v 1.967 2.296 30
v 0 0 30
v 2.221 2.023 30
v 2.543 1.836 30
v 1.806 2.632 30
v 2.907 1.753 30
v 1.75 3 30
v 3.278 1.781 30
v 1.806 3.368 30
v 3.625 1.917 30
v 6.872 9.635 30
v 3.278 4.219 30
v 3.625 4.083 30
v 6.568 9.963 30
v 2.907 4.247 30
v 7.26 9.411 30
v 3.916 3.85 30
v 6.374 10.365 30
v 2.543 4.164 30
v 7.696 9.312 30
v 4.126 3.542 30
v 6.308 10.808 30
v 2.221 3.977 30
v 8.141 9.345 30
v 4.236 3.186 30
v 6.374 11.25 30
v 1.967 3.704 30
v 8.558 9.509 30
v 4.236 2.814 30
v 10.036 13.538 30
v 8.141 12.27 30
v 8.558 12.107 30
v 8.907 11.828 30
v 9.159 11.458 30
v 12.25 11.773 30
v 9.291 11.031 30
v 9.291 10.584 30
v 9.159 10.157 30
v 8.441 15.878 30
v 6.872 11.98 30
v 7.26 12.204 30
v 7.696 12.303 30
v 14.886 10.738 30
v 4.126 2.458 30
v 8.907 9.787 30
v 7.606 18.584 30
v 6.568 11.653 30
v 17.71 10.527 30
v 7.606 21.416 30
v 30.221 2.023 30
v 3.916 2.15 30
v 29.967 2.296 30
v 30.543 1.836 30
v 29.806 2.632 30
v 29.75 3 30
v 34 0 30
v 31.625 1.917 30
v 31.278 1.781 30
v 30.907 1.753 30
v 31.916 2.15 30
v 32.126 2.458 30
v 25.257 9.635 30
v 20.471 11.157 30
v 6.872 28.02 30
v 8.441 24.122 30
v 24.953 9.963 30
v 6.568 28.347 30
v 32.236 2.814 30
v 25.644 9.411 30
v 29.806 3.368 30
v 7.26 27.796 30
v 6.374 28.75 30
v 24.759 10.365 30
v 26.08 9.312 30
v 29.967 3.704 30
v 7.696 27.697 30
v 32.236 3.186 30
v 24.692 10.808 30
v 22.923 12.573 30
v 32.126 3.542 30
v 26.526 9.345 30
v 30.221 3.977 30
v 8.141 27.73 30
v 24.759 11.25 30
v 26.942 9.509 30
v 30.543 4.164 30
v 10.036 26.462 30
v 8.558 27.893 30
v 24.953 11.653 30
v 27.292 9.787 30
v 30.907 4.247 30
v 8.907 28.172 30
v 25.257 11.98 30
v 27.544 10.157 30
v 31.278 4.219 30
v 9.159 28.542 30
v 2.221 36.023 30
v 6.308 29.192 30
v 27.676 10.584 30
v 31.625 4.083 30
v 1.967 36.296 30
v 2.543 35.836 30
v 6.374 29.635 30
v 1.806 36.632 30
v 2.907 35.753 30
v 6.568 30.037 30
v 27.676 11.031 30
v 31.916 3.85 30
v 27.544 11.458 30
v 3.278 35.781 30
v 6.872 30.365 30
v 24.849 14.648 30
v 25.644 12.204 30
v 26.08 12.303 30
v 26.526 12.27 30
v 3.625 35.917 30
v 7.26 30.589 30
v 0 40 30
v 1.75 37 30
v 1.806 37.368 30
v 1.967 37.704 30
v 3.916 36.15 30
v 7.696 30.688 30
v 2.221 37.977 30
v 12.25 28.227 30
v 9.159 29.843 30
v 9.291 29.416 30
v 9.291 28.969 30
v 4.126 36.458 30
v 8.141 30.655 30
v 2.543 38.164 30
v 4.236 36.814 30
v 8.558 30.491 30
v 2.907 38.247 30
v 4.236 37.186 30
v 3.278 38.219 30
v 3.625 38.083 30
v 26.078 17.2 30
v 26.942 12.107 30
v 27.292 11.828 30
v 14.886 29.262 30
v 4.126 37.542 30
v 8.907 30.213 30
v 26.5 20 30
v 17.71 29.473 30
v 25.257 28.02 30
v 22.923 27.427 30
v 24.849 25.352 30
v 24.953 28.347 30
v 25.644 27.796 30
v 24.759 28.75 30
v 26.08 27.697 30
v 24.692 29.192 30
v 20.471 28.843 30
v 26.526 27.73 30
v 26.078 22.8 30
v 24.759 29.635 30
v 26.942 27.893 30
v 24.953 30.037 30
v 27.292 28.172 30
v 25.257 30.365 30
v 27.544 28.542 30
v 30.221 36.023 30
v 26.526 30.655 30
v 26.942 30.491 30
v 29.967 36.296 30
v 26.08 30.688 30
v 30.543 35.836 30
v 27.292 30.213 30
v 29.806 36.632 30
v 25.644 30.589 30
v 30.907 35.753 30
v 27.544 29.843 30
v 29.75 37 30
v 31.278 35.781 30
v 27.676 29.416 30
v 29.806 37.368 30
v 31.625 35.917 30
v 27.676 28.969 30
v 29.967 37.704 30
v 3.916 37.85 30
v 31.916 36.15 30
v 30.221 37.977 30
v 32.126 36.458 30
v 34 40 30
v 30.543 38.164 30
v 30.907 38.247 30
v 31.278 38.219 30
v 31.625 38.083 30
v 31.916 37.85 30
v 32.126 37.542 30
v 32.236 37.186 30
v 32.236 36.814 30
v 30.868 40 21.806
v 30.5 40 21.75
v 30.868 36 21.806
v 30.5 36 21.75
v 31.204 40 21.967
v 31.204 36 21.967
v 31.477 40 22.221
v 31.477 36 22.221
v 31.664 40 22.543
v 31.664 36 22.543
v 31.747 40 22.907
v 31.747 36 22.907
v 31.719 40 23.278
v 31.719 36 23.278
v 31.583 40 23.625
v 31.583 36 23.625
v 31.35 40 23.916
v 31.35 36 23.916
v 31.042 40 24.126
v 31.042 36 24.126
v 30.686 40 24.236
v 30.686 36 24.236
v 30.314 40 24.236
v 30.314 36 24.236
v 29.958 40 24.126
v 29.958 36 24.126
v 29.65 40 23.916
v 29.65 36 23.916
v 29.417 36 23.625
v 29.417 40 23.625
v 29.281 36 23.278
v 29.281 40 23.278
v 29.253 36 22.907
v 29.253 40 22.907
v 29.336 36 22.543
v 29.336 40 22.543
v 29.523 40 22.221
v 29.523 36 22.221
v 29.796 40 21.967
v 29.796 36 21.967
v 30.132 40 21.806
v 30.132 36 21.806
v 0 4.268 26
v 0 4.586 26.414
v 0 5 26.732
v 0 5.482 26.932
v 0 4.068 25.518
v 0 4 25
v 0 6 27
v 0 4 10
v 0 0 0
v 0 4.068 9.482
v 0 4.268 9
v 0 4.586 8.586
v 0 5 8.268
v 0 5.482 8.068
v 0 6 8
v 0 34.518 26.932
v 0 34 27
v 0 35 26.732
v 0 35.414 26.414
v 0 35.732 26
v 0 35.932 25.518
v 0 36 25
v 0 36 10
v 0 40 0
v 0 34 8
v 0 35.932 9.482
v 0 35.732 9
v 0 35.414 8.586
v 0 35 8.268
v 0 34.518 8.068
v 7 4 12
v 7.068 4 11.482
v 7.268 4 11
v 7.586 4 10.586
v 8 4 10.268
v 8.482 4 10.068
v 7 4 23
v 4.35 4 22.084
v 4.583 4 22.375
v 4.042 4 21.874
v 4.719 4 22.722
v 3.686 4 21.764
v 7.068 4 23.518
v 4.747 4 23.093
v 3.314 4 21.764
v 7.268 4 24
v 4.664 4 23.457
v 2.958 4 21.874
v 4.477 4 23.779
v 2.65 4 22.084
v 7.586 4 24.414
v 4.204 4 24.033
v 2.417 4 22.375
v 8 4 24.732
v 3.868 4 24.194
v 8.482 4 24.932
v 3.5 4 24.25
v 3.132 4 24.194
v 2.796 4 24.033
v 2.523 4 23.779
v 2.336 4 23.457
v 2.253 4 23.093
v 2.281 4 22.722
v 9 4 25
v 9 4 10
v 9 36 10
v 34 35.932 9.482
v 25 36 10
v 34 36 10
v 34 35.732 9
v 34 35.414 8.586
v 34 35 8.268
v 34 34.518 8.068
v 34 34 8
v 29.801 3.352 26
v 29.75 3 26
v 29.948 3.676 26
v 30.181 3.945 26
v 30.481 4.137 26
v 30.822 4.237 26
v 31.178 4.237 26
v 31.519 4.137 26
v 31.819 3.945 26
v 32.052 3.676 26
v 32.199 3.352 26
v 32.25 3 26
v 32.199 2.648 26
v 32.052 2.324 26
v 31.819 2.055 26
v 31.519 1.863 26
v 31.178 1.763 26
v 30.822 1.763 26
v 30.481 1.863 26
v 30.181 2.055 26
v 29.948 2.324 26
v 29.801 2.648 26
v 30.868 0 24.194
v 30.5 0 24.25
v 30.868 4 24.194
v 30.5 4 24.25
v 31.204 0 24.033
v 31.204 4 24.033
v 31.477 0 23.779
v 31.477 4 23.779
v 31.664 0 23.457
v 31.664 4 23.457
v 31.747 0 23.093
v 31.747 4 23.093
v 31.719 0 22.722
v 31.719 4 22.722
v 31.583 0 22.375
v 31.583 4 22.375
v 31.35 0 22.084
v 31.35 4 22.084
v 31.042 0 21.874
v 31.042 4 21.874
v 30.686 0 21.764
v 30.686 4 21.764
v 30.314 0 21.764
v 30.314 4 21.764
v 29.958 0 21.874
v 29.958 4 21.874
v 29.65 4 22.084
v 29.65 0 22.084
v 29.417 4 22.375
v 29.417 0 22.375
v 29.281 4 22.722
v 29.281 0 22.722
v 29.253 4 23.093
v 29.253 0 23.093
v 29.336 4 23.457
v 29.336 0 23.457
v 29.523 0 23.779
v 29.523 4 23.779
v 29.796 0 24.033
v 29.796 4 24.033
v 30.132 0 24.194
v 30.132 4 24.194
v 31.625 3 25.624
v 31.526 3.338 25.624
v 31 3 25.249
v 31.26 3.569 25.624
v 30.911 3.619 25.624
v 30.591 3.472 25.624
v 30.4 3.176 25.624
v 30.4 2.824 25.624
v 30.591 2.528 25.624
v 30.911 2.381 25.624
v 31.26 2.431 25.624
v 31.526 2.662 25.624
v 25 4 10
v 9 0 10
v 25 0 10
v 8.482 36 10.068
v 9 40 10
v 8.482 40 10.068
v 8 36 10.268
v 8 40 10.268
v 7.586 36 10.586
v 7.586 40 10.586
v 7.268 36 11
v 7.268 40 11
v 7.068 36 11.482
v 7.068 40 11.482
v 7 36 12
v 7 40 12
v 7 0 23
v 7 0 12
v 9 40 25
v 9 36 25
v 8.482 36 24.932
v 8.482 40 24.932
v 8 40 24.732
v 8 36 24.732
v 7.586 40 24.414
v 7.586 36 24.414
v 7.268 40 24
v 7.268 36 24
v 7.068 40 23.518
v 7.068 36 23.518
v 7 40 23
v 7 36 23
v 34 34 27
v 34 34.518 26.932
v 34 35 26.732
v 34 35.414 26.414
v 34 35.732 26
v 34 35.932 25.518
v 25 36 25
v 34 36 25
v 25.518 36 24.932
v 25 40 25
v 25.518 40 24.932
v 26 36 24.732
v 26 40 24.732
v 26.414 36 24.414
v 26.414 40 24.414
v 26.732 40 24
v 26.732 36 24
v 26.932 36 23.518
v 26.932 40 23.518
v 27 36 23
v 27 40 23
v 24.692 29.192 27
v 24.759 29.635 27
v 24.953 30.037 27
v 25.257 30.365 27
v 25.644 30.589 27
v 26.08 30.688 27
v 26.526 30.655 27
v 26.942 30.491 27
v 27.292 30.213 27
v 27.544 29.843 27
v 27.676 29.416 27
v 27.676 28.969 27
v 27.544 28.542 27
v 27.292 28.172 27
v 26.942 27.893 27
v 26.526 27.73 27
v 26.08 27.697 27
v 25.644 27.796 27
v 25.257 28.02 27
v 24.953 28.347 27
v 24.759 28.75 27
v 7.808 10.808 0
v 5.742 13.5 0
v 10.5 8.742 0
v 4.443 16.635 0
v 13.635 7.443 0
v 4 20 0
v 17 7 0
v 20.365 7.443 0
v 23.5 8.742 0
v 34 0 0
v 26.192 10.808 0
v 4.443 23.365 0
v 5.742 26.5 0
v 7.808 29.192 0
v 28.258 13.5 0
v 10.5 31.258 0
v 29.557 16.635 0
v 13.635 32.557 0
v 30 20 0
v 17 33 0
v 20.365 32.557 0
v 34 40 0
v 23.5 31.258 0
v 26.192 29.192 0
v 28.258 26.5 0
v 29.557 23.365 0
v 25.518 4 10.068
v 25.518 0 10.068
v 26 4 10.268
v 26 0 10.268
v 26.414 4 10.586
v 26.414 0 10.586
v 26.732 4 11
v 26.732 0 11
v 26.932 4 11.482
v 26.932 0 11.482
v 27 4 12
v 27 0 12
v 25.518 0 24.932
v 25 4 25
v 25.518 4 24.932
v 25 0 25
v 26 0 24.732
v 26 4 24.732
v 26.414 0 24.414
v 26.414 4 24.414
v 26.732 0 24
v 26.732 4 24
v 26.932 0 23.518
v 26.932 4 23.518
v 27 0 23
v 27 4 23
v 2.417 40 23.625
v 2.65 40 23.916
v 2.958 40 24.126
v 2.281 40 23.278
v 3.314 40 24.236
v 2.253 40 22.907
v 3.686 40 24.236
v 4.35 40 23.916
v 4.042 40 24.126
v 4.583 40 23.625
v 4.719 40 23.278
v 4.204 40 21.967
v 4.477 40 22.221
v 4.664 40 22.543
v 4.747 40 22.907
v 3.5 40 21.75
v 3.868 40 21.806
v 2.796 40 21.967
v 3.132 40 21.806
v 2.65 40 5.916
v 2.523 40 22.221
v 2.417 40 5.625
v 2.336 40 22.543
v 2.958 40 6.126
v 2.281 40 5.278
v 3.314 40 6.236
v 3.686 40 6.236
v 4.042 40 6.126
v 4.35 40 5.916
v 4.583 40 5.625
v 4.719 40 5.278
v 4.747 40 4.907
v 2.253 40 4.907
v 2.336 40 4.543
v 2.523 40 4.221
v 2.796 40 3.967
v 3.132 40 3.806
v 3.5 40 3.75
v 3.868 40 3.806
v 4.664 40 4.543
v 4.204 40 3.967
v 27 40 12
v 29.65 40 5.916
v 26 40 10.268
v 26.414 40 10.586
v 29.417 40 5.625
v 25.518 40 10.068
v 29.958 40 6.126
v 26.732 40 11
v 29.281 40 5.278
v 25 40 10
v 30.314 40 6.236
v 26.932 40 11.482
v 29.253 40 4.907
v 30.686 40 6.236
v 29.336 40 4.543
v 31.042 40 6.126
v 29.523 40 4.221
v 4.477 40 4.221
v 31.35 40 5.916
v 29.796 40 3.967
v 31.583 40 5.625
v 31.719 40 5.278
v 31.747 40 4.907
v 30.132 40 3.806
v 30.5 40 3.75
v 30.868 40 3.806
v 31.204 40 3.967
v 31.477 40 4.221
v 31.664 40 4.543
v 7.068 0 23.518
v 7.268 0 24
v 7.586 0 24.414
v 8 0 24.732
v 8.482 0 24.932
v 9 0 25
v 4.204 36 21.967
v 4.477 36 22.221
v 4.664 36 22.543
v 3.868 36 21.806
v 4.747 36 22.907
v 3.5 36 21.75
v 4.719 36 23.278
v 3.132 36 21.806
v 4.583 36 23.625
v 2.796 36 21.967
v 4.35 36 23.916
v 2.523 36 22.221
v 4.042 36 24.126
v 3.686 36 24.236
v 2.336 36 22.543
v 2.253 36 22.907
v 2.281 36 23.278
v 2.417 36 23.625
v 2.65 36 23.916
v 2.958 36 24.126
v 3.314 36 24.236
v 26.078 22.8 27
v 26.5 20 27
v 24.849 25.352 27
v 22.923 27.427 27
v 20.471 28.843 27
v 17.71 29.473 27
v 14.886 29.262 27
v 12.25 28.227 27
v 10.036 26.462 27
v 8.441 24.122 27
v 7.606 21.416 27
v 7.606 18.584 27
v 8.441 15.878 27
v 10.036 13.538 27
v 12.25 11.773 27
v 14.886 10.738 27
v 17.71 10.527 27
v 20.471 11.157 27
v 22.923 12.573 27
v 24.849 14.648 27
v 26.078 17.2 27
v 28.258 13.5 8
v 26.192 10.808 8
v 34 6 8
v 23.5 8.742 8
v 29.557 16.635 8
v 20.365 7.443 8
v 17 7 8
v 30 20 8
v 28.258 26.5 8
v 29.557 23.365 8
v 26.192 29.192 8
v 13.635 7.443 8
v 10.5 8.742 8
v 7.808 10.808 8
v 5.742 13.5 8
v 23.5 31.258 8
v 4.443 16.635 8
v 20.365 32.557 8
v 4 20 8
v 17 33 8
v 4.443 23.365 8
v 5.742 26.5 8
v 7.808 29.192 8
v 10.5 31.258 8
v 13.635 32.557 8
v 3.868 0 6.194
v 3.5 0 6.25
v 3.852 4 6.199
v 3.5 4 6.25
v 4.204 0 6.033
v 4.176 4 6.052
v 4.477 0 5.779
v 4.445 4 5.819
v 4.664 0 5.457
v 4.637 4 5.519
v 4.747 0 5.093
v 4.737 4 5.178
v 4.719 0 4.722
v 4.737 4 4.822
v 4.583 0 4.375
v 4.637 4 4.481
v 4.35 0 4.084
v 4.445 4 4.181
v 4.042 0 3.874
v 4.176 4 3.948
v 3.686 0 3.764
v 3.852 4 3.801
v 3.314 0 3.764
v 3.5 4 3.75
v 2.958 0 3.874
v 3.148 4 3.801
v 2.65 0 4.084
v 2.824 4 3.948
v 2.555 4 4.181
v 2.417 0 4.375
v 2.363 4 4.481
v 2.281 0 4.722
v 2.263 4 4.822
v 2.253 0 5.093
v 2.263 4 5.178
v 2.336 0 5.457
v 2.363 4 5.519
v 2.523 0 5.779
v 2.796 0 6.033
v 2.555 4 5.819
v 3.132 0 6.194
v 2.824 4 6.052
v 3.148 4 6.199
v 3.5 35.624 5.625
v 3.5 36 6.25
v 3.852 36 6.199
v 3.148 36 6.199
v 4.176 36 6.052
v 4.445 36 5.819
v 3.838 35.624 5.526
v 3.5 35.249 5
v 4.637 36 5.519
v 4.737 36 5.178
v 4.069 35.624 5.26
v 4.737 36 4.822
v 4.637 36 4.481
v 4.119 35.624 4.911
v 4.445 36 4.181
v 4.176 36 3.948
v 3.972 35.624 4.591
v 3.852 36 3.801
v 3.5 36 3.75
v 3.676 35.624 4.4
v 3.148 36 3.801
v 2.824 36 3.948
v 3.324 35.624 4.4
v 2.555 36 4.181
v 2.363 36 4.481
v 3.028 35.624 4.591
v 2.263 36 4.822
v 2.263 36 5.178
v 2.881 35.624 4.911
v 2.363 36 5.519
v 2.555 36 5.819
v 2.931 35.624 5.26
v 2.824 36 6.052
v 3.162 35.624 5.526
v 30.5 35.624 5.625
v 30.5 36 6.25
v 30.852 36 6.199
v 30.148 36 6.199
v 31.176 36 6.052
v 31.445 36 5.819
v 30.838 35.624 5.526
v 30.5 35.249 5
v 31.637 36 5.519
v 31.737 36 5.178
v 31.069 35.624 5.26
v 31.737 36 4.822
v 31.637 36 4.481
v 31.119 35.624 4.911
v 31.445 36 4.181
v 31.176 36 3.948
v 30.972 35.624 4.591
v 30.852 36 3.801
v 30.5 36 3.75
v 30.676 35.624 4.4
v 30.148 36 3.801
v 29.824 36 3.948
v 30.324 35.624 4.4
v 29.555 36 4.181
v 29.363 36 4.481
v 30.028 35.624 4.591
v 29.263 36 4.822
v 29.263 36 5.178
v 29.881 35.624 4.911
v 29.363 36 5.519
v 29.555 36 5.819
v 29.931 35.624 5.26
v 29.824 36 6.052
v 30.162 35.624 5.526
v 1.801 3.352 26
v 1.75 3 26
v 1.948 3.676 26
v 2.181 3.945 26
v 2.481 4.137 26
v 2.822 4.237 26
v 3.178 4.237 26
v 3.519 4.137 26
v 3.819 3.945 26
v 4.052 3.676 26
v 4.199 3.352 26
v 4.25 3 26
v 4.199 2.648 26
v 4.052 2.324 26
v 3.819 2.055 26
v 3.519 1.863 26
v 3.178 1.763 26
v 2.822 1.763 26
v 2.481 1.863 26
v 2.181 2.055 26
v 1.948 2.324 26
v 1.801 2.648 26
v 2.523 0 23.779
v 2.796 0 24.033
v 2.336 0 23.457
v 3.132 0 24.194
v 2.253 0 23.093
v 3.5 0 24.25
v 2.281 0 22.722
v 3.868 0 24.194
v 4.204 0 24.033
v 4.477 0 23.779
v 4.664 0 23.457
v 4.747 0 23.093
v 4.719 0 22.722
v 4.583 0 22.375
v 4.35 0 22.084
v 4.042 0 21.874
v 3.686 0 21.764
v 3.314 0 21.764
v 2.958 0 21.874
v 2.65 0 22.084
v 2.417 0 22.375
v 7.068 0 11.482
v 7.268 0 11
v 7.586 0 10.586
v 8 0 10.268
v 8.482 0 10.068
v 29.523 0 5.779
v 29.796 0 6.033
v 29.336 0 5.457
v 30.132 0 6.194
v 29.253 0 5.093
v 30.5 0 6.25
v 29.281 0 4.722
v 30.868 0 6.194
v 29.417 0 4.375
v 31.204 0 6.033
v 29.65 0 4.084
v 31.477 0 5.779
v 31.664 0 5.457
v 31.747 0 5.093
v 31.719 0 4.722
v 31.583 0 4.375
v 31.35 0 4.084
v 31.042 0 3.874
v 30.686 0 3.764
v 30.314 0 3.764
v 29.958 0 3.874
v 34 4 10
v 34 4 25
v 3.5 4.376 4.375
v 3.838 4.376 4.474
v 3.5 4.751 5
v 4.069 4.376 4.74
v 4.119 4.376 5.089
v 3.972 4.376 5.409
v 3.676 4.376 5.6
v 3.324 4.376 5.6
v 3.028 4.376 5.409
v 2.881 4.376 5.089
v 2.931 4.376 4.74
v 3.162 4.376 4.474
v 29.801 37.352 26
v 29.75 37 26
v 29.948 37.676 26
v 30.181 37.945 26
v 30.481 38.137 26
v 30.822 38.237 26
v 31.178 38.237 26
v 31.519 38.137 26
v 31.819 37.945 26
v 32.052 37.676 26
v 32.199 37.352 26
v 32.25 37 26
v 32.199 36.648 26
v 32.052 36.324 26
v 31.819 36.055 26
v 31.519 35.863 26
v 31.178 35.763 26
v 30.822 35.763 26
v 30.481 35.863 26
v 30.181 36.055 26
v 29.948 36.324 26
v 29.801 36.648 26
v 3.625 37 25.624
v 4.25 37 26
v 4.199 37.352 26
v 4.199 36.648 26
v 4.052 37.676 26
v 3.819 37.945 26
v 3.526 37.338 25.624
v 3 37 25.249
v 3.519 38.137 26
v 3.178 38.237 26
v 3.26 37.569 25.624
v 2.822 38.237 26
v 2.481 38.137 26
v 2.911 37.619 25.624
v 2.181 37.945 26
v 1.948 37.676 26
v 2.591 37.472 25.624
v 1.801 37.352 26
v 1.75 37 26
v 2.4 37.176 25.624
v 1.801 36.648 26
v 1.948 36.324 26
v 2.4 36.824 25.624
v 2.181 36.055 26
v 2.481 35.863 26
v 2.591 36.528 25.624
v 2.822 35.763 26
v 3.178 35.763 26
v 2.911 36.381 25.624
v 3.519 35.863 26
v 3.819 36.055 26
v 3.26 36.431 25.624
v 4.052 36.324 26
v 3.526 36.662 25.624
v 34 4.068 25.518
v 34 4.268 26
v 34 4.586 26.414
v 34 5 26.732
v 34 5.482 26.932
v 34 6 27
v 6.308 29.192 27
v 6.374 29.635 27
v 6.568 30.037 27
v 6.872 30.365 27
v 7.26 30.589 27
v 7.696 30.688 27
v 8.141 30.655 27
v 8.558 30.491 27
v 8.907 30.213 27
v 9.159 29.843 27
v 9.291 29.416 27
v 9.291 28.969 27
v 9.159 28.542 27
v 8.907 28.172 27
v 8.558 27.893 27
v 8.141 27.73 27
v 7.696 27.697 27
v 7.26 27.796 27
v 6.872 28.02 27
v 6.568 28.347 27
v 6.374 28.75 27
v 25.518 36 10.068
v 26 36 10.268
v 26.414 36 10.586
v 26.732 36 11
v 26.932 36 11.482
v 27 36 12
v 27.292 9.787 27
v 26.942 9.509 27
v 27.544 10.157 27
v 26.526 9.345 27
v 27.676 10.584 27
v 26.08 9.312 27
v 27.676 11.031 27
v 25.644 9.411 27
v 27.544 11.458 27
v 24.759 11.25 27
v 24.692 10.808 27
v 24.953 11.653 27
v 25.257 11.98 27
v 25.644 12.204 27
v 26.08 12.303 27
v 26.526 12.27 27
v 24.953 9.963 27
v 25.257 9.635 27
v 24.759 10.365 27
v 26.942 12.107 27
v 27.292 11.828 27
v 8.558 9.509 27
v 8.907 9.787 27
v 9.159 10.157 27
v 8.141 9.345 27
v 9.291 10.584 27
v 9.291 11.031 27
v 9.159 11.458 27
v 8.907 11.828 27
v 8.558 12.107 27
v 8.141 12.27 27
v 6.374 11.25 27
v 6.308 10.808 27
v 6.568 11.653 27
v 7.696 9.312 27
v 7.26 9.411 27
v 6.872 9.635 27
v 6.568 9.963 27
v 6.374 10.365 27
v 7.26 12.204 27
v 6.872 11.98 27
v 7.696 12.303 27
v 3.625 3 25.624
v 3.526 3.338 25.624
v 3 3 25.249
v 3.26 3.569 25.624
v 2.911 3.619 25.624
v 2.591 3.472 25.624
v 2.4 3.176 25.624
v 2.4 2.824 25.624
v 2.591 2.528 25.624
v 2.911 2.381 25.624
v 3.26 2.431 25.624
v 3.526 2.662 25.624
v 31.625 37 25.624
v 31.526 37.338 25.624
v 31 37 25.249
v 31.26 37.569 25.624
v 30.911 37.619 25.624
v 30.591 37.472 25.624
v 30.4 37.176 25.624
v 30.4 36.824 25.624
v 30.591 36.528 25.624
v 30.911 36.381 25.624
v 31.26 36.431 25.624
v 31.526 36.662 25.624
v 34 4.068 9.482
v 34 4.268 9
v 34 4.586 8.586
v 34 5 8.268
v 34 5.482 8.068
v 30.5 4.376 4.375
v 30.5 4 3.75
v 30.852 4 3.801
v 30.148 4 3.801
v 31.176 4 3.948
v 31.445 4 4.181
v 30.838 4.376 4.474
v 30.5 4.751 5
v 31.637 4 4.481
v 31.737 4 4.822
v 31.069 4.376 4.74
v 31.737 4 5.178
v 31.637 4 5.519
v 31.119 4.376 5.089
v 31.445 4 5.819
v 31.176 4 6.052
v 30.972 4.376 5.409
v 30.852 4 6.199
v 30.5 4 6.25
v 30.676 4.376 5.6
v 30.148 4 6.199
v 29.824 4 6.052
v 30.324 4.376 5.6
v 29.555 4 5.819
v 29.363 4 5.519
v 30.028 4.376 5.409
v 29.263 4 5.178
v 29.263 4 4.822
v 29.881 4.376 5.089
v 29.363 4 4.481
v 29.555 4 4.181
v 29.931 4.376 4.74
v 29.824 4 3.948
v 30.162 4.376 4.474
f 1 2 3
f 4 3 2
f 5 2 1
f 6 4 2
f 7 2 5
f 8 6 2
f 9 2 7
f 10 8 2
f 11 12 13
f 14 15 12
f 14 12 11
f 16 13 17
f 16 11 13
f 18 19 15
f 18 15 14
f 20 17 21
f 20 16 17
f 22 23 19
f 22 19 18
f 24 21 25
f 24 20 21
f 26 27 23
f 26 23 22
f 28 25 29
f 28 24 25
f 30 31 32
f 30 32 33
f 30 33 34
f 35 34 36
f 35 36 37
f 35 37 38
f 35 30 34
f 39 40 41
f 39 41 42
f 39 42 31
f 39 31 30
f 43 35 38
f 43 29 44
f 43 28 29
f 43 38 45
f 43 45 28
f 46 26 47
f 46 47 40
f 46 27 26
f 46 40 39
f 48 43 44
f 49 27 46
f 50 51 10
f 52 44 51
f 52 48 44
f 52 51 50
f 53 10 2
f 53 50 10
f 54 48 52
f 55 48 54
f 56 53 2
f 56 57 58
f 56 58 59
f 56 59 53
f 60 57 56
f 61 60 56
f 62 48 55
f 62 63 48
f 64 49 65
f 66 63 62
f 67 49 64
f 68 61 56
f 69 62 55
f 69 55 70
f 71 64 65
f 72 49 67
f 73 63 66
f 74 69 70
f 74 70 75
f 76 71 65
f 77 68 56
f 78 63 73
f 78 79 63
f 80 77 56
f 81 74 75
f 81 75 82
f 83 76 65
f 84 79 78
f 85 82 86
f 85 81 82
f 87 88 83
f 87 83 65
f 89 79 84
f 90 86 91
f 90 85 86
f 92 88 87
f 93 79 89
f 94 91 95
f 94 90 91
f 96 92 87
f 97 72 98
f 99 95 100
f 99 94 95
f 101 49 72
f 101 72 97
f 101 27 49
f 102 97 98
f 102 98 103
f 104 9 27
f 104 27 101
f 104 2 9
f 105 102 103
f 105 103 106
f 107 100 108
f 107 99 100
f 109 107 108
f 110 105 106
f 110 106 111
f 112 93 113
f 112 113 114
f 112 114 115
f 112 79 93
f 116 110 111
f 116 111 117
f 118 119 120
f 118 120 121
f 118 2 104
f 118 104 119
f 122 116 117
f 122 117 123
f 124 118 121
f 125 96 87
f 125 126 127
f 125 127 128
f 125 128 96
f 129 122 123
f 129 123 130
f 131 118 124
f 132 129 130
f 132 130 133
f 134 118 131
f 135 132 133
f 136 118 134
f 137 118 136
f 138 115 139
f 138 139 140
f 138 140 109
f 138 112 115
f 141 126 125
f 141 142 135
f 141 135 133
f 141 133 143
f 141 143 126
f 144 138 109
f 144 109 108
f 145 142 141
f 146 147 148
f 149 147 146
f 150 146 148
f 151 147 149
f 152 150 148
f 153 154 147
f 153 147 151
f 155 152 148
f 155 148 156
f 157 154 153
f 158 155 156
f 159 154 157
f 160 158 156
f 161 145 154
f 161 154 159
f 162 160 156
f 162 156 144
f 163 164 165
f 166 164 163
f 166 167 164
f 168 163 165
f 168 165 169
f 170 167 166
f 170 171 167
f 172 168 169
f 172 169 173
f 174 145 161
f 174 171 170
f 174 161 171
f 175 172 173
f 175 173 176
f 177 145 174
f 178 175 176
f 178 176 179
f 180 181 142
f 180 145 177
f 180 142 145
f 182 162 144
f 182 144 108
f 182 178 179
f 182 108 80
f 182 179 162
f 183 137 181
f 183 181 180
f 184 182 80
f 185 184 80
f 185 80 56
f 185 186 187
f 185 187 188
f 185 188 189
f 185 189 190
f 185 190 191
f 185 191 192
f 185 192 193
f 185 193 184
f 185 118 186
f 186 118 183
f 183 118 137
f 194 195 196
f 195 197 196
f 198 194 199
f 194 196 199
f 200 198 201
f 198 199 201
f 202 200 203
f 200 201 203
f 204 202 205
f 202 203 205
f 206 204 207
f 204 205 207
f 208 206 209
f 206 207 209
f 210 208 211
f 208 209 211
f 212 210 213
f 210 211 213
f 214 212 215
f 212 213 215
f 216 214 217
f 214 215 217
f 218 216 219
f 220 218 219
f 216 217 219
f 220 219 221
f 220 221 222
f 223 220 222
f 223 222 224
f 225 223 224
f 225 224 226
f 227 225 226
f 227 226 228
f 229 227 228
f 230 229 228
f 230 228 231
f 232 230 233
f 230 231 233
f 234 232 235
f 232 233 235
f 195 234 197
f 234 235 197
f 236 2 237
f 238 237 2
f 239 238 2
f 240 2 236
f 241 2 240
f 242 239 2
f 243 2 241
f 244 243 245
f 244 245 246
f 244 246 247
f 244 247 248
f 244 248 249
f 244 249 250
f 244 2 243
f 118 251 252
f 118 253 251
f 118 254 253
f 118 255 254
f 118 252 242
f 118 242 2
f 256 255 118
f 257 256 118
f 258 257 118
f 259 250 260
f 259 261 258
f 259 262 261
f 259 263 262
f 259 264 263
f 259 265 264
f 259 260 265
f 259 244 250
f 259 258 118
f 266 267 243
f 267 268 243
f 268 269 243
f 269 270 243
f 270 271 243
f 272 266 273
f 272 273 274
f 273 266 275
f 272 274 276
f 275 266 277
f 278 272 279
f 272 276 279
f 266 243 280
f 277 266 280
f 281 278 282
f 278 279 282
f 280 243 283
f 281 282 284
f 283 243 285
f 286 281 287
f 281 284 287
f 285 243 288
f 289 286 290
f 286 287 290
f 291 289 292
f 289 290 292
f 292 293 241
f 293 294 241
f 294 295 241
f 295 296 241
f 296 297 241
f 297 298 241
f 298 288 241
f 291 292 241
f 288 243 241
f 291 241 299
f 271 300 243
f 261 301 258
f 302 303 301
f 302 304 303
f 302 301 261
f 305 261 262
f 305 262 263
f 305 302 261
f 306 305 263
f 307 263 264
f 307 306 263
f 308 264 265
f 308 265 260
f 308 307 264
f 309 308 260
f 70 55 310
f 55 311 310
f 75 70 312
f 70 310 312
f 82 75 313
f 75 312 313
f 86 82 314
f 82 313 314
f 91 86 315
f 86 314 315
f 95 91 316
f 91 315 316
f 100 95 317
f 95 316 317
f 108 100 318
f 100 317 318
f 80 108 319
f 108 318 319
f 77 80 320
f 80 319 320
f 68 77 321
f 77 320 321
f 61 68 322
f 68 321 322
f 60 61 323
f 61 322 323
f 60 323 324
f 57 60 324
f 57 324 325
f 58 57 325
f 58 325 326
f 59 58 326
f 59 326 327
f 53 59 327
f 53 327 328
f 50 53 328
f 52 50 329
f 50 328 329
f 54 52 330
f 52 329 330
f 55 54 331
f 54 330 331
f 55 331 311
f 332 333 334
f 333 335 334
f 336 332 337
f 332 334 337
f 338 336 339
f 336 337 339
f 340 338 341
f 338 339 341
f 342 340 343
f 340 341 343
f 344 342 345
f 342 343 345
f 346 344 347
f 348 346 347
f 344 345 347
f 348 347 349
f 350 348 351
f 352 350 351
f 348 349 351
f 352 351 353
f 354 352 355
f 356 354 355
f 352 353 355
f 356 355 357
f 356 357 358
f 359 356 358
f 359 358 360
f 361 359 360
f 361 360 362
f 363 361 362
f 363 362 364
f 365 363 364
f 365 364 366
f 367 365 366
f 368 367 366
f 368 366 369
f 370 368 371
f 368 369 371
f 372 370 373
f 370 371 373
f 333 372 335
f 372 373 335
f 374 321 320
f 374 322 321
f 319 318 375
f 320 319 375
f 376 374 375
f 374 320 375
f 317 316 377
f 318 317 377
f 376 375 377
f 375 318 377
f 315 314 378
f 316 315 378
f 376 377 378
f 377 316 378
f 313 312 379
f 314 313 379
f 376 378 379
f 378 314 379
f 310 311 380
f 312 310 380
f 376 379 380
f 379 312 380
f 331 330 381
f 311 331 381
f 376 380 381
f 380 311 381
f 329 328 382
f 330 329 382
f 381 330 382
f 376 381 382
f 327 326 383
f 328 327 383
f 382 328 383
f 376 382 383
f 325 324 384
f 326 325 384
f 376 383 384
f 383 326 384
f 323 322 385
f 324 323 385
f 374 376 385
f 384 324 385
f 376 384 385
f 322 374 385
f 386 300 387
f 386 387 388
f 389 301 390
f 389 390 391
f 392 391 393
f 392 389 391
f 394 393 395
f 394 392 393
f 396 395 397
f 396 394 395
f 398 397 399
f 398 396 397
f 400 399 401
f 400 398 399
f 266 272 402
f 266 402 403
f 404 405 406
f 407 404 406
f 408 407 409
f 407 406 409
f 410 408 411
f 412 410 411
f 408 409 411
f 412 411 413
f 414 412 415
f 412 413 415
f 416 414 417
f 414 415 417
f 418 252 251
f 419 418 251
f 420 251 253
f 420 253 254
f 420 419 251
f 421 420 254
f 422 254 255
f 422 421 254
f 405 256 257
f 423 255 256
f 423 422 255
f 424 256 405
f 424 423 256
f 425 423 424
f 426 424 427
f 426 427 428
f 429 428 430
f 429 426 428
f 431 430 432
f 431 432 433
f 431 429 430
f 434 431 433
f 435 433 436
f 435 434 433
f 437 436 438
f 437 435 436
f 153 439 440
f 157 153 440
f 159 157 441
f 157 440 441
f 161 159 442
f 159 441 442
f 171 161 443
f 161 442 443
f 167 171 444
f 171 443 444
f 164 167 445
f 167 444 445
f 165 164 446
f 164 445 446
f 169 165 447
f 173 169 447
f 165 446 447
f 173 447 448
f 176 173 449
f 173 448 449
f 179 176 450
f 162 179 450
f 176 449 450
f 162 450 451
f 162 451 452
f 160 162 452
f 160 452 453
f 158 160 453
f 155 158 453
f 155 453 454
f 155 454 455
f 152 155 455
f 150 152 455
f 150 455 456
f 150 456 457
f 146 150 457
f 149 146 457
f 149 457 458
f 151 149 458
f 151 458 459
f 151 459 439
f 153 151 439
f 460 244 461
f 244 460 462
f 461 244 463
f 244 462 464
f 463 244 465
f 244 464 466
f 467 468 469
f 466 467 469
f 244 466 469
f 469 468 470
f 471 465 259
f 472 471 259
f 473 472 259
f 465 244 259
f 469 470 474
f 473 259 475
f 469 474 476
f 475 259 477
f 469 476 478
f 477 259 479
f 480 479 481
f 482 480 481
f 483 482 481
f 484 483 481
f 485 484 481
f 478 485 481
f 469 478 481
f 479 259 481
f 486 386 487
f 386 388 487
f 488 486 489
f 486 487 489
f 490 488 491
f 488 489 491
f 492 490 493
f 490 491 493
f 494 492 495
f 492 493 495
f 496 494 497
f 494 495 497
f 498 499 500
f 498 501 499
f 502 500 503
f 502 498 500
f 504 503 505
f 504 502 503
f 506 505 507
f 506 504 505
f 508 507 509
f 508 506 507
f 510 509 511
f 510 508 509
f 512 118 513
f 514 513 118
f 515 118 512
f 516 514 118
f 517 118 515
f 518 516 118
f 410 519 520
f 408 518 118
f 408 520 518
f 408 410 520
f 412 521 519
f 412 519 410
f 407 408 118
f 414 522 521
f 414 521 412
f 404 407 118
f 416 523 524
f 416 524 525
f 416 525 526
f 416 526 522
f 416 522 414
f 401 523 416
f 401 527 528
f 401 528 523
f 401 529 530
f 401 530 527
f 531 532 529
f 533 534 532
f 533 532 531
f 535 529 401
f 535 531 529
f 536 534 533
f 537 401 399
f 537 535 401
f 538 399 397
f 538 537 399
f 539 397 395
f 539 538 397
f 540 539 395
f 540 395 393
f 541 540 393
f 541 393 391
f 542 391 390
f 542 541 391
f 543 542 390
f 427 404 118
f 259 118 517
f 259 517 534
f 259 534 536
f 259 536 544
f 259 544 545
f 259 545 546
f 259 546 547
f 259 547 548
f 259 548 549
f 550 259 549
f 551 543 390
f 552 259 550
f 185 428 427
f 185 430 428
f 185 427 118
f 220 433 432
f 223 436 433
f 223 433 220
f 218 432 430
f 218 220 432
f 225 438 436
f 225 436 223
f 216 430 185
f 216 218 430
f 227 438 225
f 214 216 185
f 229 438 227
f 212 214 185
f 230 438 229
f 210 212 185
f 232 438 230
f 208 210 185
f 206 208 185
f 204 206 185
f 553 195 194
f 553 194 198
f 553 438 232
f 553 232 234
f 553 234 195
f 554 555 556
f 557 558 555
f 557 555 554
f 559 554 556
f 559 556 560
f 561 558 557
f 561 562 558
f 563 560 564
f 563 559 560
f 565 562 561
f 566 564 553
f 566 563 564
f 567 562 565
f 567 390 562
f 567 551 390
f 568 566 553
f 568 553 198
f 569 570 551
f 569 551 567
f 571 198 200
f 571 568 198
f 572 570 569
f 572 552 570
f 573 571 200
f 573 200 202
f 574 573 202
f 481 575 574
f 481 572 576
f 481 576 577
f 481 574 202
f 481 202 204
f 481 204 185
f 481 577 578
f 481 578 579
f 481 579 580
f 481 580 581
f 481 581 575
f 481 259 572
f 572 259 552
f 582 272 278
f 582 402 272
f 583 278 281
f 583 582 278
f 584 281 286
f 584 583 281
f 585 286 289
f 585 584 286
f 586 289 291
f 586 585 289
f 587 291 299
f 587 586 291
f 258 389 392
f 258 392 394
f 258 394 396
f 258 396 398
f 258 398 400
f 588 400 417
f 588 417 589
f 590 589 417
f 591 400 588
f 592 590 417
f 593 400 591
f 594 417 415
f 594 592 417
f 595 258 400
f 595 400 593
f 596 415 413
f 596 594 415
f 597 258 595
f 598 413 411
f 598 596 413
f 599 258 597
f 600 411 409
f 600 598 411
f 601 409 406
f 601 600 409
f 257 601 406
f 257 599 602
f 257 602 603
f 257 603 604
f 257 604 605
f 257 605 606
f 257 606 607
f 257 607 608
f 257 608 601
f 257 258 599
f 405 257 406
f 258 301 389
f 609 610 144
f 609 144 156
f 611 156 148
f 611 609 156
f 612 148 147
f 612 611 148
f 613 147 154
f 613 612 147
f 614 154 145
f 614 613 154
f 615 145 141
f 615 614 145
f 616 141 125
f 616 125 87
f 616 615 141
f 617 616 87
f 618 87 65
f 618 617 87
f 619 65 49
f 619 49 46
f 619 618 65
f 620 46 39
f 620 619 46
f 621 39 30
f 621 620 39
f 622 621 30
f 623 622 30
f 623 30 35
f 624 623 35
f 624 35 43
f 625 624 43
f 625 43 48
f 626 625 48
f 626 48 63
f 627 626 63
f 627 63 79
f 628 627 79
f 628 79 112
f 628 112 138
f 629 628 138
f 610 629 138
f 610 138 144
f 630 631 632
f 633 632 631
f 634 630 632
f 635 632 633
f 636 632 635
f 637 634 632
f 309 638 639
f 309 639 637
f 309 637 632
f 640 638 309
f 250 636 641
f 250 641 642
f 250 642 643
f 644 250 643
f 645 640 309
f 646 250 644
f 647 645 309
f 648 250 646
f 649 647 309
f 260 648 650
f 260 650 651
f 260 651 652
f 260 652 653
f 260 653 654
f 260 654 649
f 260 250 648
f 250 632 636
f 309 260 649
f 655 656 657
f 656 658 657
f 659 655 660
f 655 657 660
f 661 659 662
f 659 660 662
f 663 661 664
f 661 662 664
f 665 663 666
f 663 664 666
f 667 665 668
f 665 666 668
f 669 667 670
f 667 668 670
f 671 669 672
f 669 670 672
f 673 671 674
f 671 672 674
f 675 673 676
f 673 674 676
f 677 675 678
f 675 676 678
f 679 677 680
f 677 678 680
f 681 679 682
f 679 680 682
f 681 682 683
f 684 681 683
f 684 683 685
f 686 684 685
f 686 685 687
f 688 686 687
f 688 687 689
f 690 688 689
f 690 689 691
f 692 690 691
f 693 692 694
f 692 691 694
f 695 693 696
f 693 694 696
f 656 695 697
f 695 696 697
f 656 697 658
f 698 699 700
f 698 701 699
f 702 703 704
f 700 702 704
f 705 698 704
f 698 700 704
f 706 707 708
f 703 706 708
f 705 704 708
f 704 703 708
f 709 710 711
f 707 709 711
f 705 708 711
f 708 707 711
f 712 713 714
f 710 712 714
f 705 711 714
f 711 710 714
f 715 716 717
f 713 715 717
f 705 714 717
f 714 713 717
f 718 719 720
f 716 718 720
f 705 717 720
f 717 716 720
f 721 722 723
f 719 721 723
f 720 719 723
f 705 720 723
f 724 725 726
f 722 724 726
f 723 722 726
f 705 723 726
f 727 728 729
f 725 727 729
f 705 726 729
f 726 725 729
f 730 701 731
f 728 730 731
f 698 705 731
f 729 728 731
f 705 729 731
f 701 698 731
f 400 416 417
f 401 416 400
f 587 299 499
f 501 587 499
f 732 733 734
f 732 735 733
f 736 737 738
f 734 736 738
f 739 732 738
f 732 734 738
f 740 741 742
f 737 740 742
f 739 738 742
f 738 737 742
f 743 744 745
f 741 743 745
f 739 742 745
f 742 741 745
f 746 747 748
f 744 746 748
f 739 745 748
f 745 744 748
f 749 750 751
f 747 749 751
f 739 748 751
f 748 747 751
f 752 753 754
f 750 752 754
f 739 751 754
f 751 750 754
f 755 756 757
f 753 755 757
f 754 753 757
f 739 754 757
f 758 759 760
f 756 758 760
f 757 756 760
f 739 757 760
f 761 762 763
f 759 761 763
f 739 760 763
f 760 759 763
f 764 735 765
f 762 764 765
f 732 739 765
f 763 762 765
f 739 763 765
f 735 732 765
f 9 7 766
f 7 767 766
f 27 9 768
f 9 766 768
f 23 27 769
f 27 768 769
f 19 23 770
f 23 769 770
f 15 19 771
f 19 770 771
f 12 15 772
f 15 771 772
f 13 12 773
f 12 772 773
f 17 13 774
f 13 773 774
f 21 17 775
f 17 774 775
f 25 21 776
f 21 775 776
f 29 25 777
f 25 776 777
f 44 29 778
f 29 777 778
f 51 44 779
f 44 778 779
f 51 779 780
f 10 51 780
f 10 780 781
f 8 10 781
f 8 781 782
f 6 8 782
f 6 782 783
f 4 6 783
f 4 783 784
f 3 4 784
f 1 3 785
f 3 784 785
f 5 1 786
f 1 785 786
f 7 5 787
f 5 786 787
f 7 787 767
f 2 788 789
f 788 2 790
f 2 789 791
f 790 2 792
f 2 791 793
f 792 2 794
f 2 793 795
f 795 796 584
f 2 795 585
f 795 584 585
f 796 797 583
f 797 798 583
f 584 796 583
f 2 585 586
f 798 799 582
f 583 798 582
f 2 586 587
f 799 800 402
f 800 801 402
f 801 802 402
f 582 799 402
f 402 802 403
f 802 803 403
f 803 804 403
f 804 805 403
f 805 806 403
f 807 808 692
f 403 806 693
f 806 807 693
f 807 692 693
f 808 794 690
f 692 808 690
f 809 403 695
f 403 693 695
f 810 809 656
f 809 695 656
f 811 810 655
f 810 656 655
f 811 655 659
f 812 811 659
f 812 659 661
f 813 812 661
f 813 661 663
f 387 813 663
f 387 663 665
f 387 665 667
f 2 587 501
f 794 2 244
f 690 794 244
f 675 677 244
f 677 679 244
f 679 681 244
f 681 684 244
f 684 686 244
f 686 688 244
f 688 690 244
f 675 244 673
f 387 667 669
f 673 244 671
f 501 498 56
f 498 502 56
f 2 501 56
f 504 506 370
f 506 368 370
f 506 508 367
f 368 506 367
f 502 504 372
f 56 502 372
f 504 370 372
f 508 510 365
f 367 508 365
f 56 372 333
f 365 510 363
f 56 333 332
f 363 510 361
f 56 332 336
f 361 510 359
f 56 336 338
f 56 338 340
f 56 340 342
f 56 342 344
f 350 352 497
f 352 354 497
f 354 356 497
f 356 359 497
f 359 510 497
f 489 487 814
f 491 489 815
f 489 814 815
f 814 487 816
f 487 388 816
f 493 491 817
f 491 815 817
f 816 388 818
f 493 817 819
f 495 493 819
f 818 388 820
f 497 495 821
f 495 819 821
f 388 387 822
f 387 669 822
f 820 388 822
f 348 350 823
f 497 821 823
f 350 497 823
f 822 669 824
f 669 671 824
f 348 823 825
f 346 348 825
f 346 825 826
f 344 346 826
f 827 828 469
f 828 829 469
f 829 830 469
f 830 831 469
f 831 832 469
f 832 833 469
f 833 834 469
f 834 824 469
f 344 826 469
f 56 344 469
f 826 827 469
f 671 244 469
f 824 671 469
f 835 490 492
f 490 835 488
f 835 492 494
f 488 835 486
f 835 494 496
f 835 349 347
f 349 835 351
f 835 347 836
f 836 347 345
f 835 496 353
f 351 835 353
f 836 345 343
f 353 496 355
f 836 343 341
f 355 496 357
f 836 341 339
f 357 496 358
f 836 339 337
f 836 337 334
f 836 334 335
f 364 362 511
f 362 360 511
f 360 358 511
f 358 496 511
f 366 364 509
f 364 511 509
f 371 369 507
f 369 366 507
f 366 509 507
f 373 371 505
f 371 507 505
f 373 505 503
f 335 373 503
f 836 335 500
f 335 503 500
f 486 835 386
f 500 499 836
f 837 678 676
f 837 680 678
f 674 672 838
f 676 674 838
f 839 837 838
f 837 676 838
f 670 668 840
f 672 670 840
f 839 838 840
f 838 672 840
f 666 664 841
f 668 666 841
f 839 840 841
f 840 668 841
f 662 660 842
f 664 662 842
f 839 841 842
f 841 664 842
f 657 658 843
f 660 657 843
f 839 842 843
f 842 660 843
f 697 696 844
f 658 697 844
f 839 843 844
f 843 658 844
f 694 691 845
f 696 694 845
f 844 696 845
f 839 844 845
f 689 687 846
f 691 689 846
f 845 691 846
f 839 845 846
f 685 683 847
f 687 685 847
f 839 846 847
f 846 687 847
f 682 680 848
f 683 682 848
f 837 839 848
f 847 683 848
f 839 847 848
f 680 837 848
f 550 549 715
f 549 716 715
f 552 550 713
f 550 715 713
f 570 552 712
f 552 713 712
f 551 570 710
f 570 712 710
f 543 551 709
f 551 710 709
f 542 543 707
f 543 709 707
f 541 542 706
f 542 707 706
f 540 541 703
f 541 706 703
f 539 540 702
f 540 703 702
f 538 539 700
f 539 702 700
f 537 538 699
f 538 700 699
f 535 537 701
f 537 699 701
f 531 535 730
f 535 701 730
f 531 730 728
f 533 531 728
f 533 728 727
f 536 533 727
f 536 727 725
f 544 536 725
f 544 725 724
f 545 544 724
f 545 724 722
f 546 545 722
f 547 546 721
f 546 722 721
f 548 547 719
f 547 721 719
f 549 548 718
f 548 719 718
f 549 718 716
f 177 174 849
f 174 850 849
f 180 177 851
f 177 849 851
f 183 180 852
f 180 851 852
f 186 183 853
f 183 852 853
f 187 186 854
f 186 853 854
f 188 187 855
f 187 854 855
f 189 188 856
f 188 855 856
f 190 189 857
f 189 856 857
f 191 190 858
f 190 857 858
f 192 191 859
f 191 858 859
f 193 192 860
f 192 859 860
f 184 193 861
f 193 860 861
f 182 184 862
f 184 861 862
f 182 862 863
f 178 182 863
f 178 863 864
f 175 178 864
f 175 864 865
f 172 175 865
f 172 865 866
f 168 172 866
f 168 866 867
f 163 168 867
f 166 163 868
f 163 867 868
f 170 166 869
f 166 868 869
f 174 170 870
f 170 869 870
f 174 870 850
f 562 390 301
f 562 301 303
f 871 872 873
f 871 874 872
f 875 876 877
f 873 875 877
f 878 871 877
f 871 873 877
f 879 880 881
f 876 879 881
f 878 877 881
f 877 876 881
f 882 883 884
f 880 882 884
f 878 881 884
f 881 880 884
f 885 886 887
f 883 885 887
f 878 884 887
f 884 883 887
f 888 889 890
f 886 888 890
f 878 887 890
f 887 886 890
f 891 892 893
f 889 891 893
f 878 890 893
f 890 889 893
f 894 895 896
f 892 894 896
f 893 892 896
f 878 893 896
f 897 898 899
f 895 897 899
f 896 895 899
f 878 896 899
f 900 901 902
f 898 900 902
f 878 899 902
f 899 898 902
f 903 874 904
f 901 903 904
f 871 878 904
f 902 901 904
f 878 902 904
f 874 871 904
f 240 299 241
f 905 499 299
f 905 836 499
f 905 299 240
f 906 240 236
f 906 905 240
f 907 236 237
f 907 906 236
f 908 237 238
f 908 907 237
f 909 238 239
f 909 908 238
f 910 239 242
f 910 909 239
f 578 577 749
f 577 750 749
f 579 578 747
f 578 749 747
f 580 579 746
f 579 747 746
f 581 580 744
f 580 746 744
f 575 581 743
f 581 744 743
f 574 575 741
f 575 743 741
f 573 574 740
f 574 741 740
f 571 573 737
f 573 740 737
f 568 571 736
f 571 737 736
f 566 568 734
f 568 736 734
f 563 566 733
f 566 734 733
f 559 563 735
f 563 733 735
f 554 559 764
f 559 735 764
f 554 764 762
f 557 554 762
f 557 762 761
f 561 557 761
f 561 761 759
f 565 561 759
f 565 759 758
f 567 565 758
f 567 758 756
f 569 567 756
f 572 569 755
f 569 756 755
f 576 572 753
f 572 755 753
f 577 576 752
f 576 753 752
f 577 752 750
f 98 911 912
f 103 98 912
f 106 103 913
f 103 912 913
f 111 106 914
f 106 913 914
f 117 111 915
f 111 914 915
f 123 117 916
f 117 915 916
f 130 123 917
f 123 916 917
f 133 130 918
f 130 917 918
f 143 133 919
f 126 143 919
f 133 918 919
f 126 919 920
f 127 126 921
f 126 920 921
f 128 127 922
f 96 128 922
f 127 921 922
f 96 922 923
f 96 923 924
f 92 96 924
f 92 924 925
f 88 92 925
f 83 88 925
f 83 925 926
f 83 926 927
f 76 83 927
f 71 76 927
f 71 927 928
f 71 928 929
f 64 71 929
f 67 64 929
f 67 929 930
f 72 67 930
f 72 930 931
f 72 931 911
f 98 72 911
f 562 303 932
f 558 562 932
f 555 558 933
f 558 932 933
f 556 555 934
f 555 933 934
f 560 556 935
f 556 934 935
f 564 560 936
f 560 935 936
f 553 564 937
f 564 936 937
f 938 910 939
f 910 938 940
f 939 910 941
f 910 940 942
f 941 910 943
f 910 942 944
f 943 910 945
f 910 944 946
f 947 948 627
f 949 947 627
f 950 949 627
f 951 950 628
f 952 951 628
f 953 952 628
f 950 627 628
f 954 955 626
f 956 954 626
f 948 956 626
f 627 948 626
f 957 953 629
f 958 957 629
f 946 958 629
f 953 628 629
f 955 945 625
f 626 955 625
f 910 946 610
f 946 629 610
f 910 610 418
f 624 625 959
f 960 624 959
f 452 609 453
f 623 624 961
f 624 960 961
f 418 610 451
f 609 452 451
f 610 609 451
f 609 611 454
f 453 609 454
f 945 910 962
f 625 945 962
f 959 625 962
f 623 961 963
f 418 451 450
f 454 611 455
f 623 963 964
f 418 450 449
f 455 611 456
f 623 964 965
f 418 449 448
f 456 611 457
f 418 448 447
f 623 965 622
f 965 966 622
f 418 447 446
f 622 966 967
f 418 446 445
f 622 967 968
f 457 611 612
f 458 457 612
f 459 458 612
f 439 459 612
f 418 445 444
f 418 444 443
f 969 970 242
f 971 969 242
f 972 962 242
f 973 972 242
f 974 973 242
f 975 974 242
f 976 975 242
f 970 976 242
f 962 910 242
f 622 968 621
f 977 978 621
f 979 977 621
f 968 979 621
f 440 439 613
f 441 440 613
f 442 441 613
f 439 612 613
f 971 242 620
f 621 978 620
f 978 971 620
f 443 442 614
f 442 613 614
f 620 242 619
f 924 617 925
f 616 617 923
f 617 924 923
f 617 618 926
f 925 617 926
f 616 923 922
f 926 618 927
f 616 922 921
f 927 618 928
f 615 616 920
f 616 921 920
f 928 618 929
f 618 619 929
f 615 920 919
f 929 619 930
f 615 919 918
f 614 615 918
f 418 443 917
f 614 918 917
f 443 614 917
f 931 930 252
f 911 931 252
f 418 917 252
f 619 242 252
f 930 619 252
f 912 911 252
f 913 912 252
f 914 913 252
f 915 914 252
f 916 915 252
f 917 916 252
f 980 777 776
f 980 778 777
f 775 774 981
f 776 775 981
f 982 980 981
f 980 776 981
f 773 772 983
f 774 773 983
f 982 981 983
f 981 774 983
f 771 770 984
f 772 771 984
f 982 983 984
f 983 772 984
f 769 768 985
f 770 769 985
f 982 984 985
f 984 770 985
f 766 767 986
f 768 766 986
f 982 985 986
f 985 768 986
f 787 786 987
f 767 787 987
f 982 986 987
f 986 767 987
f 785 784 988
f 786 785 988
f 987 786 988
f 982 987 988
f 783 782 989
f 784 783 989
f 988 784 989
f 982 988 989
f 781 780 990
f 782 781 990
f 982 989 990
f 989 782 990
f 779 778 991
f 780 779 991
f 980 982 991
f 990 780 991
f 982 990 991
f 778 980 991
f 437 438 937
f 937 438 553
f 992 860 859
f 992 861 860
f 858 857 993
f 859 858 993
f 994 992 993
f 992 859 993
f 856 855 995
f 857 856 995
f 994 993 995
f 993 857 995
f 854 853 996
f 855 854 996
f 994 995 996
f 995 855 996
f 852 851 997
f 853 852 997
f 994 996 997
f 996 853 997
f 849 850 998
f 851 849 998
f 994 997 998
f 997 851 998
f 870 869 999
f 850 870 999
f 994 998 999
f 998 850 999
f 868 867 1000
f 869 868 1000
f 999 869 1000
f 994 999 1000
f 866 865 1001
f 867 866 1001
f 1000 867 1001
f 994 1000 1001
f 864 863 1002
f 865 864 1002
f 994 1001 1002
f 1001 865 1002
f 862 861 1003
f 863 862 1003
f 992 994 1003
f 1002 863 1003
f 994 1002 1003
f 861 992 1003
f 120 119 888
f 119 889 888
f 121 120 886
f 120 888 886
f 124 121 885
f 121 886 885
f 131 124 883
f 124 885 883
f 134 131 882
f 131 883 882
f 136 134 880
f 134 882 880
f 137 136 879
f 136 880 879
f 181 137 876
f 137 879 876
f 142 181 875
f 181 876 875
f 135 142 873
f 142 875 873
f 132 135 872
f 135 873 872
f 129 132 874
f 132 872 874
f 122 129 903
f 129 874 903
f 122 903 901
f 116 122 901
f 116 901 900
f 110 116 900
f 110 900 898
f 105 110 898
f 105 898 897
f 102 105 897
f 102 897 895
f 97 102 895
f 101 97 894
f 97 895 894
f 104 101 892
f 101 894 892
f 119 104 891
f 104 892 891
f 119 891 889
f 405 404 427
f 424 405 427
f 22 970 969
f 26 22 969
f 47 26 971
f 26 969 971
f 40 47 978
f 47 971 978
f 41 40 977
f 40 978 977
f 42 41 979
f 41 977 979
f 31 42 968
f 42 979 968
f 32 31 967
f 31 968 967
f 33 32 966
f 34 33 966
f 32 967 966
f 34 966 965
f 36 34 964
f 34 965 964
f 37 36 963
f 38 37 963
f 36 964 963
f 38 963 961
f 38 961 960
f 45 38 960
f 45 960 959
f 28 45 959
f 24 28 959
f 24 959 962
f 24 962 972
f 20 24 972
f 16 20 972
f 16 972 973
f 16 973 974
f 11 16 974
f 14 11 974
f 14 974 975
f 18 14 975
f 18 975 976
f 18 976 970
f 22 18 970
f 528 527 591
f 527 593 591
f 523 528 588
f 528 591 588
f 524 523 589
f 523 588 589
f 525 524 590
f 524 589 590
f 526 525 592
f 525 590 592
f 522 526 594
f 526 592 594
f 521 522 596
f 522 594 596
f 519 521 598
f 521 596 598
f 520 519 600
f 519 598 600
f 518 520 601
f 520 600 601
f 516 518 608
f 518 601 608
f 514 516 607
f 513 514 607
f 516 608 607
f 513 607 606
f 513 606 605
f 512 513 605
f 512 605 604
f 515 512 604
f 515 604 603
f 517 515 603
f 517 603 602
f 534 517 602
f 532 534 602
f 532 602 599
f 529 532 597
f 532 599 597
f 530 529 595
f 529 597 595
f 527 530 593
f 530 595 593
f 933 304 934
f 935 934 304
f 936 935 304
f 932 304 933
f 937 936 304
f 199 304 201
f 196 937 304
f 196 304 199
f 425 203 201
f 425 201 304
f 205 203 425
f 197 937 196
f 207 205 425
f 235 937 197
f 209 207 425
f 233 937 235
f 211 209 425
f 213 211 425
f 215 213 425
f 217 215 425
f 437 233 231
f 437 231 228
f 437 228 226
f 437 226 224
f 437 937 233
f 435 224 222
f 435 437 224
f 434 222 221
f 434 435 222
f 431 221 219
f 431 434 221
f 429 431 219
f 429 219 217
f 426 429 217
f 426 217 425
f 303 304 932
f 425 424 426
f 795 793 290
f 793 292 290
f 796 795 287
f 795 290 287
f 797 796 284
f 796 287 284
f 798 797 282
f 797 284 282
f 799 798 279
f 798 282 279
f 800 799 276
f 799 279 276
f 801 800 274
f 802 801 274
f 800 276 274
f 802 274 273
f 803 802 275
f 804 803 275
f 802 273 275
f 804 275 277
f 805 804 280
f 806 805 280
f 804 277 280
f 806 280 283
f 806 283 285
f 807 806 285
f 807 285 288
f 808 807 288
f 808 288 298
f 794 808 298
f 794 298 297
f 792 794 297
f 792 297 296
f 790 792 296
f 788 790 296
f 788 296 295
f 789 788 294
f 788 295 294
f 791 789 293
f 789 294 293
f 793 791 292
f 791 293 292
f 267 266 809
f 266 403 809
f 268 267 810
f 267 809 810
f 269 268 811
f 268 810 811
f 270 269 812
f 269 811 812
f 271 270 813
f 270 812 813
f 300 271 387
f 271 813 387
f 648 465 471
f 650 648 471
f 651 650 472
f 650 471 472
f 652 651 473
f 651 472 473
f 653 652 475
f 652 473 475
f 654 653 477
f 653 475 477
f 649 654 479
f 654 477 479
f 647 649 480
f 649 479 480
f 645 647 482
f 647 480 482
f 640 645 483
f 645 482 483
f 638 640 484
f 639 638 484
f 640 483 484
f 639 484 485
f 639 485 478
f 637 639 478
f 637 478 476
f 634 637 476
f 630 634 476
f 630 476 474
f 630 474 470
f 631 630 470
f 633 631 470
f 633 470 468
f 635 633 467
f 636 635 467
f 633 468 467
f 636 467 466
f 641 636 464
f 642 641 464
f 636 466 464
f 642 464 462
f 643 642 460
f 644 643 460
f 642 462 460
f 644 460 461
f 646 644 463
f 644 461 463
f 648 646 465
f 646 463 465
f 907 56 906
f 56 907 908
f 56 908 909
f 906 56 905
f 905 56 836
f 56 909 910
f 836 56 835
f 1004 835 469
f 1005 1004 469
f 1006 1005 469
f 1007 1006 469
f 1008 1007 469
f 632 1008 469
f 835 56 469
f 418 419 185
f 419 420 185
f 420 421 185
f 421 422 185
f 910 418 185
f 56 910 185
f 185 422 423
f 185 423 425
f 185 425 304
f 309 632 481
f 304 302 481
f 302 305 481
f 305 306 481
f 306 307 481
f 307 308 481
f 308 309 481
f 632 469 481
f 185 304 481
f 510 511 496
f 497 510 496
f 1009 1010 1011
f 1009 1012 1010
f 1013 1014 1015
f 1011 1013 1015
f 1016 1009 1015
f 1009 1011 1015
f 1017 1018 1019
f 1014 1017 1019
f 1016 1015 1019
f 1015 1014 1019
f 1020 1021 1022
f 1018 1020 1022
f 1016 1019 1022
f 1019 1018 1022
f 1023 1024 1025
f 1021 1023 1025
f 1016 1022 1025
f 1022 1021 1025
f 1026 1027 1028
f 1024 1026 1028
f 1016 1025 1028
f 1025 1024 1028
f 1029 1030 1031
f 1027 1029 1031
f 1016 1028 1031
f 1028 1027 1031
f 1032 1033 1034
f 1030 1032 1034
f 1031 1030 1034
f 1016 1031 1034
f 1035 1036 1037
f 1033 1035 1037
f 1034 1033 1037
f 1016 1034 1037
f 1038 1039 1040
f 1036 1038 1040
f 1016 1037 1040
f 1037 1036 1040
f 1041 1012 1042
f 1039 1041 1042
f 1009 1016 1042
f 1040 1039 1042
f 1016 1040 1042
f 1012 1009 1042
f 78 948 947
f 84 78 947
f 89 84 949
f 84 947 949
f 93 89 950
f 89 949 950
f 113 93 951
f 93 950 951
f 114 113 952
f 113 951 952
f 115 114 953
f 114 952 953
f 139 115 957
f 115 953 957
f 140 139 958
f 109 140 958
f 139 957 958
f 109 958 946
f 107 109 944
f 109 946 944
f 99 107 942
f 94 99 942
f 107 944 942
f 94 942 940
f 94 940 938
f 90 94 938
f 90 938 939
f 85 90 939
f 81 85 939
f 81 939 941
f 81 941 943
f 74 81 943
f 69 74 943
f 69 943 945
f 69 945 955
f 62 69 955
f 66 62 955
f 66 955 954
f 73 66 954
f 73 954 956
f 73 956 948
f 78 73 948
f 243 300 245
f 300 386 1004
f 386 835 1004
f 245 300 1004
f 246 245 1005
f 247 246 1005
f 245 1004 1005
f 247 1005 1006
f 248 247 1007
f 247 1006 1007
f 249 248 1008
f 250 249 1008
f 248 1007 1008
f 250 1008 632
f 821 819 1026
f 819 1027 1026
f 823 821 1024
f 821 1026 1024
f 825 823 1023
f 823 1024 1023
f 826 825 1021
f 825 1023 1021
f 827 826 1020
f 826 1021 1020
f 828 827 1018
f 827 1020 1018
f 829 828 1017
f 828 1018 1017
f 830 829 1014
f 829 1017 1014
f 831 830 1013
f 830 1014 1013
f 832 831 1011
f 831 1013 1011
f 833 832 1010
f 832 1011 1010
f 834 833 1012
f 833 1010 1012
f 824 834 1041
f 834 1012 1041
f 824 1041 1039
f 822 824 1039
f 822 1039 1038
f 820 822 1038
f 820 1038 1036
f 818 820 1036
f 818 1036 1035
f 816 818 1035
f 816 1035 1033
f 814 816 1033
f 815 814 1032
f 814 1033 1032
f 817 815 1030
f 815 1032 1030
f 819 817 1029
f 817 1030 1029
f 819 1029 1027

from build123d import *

# Parameters (mm, degrees)
SKETCH_1_W                = 34
SKETCH_1_H                = 40
SKETCH_1_R                = 9.5
EXTRUDE_1_DEPTH           = 30
SKETCH_3_W                = 19
SKETCH_3_H                = 32
CUT_EXTRUDE_1_DEPTH       = 61.464865831
FILLET_3_R                = 2
HOLE_WIZARD_M3_2_D        = 2.5
HOLE_WIZARD_M3_2_DEPTH    = 4
HOLE_WIZARD_M3_2_TIP      = 0.751075774
HOLE_WIZARD_M3_4_D        = 2.5
HOLE_WIZARD_M3_4_DEPTH    = 4
HOLE_WIZARD_M3_4_TIP      = 0.751075774
SKETCH_18_W               = 20
SKETCH_18_H               = 15
CUT_EXTRUDE_8_DEPTH       = 61.464865831
SKETCH_12_R               = 13
CUT_EXTRUDE_6_DEPTH       = 8
HOLE_WIZARD_3_0_3_1_D     = 3
HOLE_WIZARD_3_0_3_1_DEPTH = 3
FILLET_7_R                = 2
HOLE_WIZARD_M3_3_D        = 2.5
HOLE_WIZARD_M3_3_DEPTH    = 4
HOLE_WIZARD_M3_3_TIP      = 0.751075774


with BuildPart() as part:
    # 草图1 → 凸台-拉伸1 (new body)
    with BuildSketch(Plane.XY):
        with Locations((17, 20)):
            Rectangle(SKETCH_1_W, SKETCH_1_H)
        with Locations((17, 20)):
            Circle(SKETCH_1_R, mode=Mode.SUBTRACT)
    extrude(amount=EXTRUDE_1_DEPTH)

    # 草图3 → 切除-拉伸1 (cut, through all)
    with BuildSketch(Plane.ZY):
        with Locations((17.5, 20)):
            Rectangle(SKETCH_3_W, SKETCH_3_H)
    extrude(amount=-CUT_EXTRUDE_1_DEPTH, mode=Mode.SUBTRACT)

    # 圆角3
    fillet_3_edges = [part.edges().sort_by_distance(p)[0] for p in [
        (17, 36, 27),
        (17, 4, 27),
        (17, 4, 8),
        (17, 36, 8),
    ]]
    fillet(fillet_3_edges, radius=FILLET_3_R)

    # M3 螺纹孔2
    with Locations(Plane(origin=(3.5, 40, 5), x_dir=(0, 0, 1), z_dir=(0, 1, 0))):
        with Locations((0, 0), (0, 27), (18, 27), (18, 0)):
            Hole(HOLE_WIZARD_M3_2_D / 2, depth=HOLE_WIZARD_M3_2_DEPTH)
            with Locations((0, 0, -(HOLE_WIZARD_M3_2_DEPTH + HOLE_WIZARD_M3_2_TIP / 2))):  # 118° drill point
                Cone(0, HOLE_WIZARD_M3_2_D / 2, HOLE_WIZARD_M3_2_TIP, mode=Mode.SUBTRACT)

    # M3 螺纹孔4
    with Locations(Plane(origin=(3.5, 0, 5), x_dir=(0, 0, -1), z_dir=(0, -1, 0))):
        with Locations((0, 0), (-18, 0), (-18, 27), (0, 27)):
            Hole(HOLE_WIZARD_M3_4_D / 2, depth=HOLE_WIZARD_M3_4_DEPTH)
            with Locations((0, 0, -(HOLE_WIZARD_M3_4_DEPTH + HOLE_WIZARD_M3_4_TIP / 2))):  # 118° drill point
                Cone(0, HOLE_WIZARD_M3_4_D / 2, HOLE_WIZARD_M3_4_TIP, mode=Mode.SUBTRACT)

    # 草图18 → 切除-拉伸8 (cut, through all)
    with BuildSketch(Plane(origin=(0, 40, 0), x_dir=(1, 0, 0), z_dir=(0, 1, 0))):
        with Locations((17, -17.5)):
            Rectangle(SKETCH_18_W, SKETCH_18_H)
    extrude(amount=-CUT_EXTRUDE_8_DEPTH, mode=Mode.SUBTRACT)

    # 草图12 → 切除-拉伸6 (cut)
    with BuildSketch(Plane(origin=(0, 0, 0), x_dir=(-1, 0, 0), z_dir=(0, 0, -1))):
        with Locations((-17, 20)):
            Circle(SKETCH_12_R)
    extrude(amount=-CUT_EXTRUDE_6_DEPTH, mode=Mode.SUBTRACT)

    # Ø3.0 (3) 直径孔1
    with Locations(Plane(origin=(7.807611845, 29.192388155, 30), x_dir=(1, 0, 0), z_dir=(0, 0, 1))):
        with Locations((0, 0), (18.38477631, 0), (18.38477631, -18.38477631), (0, -18.38477631)):
            Hole(HOLE_WIZARD_3_0_3_1_D / 2, depth=HOLE_WIZARD_3_0_3_1_DEPTH)

    # 圆角7
    fillet_7_edges = [part.edges().sort_by_distance(p)[0] for p in [
        (27, 38, 25),
        (27, 2, 25),
        (27, 2, 10),
        (27, 38, 10),
        (7, 2, 25),
        (7, 38, 25),
        (7, 38, 10),
        (7, 2, 10),
    ]]
    fillet(fillet_7_edges, radius=FILLET_7_R)

    # M3 螺纹孔3
    with Locations(Plane(origin=(3, 37, 30), x_dir=(1, 0, 0), z_dir=(0, 0, 1))):
        with Locations((0, 0), (28, 0), (28, -34), (0, -34)):
            Hole(HOLE_WIZARD_M3_3_D / 2, depth=HOLE_WIZARD_M3_3_DEPTH)
            with Locations((0, 0, -(HOLE_WIZARD_M3_3_DEPTH + HOLE_WIZARD_M3_3_TIP / 2))):  # 118° drill point
                Cone(0, HOLE_WIZARD_M3_3_D / 2, HOLE_WIZARD_M3_3_TIP, mode=Mode.SUBTRACT)


solid = part.part
